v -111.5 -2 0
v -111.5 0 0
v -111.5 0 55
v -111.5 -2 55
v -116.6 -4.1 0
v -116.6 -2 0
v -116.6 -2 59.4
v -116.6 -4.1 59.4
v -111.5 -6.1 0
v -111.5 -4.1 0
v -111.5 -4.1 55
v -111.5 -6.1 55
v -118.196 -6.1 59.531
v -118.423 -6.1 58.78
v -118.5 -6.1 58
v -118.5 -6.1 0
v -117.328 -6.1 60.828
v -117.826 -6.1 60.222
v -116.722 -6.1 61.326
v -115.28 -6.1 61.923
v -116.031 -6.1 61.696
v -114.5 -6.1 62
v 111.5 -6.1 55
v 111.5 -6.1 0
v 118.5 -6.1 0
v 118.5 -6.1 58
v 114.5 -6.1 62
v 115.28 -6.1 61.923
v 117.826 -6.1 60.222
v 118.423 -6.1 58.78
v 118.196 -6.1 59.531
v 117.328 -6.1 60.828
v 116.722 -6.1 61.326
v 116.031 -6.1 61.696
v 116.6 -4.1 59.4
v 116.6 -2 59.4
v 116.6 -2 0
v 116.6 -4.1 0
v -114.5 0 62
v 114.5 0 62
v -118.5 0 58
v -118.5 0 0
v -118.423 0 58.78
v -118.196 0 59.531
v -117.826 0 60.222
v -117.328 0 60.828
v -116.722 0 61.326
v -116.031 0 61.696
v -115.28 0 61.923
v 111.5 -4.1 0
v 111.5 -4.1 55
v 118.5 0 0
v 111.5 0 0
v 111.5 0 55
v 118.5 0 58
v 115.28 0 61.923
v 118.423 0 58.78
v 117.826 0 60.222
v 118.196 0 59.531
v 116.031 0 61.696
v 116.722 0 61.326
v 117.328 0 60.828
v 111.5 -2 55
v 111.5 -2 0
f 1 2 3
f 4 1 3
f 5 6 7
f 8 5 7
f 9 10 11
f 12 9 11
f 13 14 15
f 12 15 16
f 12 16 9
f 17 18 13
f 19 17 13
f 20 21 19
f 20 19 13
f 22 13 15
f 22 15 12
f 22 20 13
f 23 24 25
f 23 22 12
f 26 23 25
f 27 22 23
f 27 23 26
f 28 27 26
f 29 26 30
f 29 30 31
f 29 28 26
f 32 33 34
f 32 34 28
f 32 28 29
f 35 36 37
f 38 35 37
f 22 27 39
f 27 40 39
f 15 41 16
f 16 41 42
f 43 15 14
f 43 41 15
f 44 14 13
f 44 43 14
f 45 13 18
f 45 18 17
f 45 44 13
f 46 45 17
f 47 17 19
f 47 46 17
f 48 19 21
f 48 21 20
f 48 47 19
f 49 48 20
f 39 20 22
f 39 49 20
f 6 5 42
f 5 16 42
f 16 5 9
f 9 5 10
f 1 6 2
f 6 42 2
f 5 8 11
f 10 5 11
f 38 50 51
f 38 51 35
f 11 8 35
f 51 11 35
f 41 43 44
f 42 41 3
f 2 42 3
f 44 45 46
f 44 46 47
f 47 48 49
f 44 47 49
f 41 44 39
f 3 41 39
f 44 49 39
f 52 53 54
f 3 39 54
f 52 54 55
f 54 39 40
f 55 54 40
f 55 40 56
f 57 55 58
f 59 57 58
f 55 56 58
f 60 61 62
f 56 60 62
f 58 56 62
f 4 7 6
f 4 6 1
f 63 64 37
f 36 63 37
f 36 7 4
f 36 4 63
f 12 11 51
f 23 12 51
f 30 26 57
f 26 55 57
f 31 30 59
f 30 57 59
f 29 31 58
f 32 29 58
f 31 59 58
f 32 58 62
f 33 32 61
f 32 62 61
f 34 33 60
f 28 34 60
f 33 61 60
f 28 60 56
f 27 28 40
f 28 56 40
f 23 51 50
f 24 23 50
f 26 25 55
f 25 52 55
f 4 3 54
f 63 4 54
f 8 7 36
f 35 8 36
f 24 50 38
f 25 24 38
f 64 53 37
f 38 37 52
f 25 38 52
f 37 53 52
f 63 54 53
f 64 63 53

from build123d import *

# Parameters (mm, degrees)
F1_DEPTH = 2
F3_DEPTH = 2.1
F5_DEPTH = 2
F6_R     = 4


with BuildPart() as f1:
    # F0 (on Front) → F1 (new body)
    with BuildSketch(Plane.XZ):
        Polygon((-118.5, 62), (-118.5, 0), (-111.5, 0), (-111.5, 55), (111.5, 55), (111.5, 0), (118.5, 0), (118.5, 62), align=None)
    extrude(amount=F1_DEPTH)

    # F2 (on face) → F3 (join)
    with BuildSketch(Plane.XZ.offset(2)):
        Polygon((-118.5, 62), (-118.5, 0), (-116.6, 0), (-116.6, 59.4), (116.6, 59.4), (116.6, 0), (118.5, 0), (118.5, 62), align=None)
    extrude(amount=F3_DEPTH)

    # F4 (on face) → F5 (join)
    with BuildSketch(Plane.XZ.offset(4.1)):
        Polygon((-118.5, 62), (-118.5, 0), (-111.5, 0), (-111.5, 55), (111.5, 55), (111.5, 0), (118.5, 0), (118.5, 62), align=None)
    extrude(amount=F5_DEPTH)

    # F6
    f6_edges = [f1.edges().sort_by_distance(p)[0] for p in [
        (-118.5, -3.05, 62),
        (118.5, -3.05, 62),
    ]]
    fillet(f6_edges, radius=F6_R)


solid = f1.part
